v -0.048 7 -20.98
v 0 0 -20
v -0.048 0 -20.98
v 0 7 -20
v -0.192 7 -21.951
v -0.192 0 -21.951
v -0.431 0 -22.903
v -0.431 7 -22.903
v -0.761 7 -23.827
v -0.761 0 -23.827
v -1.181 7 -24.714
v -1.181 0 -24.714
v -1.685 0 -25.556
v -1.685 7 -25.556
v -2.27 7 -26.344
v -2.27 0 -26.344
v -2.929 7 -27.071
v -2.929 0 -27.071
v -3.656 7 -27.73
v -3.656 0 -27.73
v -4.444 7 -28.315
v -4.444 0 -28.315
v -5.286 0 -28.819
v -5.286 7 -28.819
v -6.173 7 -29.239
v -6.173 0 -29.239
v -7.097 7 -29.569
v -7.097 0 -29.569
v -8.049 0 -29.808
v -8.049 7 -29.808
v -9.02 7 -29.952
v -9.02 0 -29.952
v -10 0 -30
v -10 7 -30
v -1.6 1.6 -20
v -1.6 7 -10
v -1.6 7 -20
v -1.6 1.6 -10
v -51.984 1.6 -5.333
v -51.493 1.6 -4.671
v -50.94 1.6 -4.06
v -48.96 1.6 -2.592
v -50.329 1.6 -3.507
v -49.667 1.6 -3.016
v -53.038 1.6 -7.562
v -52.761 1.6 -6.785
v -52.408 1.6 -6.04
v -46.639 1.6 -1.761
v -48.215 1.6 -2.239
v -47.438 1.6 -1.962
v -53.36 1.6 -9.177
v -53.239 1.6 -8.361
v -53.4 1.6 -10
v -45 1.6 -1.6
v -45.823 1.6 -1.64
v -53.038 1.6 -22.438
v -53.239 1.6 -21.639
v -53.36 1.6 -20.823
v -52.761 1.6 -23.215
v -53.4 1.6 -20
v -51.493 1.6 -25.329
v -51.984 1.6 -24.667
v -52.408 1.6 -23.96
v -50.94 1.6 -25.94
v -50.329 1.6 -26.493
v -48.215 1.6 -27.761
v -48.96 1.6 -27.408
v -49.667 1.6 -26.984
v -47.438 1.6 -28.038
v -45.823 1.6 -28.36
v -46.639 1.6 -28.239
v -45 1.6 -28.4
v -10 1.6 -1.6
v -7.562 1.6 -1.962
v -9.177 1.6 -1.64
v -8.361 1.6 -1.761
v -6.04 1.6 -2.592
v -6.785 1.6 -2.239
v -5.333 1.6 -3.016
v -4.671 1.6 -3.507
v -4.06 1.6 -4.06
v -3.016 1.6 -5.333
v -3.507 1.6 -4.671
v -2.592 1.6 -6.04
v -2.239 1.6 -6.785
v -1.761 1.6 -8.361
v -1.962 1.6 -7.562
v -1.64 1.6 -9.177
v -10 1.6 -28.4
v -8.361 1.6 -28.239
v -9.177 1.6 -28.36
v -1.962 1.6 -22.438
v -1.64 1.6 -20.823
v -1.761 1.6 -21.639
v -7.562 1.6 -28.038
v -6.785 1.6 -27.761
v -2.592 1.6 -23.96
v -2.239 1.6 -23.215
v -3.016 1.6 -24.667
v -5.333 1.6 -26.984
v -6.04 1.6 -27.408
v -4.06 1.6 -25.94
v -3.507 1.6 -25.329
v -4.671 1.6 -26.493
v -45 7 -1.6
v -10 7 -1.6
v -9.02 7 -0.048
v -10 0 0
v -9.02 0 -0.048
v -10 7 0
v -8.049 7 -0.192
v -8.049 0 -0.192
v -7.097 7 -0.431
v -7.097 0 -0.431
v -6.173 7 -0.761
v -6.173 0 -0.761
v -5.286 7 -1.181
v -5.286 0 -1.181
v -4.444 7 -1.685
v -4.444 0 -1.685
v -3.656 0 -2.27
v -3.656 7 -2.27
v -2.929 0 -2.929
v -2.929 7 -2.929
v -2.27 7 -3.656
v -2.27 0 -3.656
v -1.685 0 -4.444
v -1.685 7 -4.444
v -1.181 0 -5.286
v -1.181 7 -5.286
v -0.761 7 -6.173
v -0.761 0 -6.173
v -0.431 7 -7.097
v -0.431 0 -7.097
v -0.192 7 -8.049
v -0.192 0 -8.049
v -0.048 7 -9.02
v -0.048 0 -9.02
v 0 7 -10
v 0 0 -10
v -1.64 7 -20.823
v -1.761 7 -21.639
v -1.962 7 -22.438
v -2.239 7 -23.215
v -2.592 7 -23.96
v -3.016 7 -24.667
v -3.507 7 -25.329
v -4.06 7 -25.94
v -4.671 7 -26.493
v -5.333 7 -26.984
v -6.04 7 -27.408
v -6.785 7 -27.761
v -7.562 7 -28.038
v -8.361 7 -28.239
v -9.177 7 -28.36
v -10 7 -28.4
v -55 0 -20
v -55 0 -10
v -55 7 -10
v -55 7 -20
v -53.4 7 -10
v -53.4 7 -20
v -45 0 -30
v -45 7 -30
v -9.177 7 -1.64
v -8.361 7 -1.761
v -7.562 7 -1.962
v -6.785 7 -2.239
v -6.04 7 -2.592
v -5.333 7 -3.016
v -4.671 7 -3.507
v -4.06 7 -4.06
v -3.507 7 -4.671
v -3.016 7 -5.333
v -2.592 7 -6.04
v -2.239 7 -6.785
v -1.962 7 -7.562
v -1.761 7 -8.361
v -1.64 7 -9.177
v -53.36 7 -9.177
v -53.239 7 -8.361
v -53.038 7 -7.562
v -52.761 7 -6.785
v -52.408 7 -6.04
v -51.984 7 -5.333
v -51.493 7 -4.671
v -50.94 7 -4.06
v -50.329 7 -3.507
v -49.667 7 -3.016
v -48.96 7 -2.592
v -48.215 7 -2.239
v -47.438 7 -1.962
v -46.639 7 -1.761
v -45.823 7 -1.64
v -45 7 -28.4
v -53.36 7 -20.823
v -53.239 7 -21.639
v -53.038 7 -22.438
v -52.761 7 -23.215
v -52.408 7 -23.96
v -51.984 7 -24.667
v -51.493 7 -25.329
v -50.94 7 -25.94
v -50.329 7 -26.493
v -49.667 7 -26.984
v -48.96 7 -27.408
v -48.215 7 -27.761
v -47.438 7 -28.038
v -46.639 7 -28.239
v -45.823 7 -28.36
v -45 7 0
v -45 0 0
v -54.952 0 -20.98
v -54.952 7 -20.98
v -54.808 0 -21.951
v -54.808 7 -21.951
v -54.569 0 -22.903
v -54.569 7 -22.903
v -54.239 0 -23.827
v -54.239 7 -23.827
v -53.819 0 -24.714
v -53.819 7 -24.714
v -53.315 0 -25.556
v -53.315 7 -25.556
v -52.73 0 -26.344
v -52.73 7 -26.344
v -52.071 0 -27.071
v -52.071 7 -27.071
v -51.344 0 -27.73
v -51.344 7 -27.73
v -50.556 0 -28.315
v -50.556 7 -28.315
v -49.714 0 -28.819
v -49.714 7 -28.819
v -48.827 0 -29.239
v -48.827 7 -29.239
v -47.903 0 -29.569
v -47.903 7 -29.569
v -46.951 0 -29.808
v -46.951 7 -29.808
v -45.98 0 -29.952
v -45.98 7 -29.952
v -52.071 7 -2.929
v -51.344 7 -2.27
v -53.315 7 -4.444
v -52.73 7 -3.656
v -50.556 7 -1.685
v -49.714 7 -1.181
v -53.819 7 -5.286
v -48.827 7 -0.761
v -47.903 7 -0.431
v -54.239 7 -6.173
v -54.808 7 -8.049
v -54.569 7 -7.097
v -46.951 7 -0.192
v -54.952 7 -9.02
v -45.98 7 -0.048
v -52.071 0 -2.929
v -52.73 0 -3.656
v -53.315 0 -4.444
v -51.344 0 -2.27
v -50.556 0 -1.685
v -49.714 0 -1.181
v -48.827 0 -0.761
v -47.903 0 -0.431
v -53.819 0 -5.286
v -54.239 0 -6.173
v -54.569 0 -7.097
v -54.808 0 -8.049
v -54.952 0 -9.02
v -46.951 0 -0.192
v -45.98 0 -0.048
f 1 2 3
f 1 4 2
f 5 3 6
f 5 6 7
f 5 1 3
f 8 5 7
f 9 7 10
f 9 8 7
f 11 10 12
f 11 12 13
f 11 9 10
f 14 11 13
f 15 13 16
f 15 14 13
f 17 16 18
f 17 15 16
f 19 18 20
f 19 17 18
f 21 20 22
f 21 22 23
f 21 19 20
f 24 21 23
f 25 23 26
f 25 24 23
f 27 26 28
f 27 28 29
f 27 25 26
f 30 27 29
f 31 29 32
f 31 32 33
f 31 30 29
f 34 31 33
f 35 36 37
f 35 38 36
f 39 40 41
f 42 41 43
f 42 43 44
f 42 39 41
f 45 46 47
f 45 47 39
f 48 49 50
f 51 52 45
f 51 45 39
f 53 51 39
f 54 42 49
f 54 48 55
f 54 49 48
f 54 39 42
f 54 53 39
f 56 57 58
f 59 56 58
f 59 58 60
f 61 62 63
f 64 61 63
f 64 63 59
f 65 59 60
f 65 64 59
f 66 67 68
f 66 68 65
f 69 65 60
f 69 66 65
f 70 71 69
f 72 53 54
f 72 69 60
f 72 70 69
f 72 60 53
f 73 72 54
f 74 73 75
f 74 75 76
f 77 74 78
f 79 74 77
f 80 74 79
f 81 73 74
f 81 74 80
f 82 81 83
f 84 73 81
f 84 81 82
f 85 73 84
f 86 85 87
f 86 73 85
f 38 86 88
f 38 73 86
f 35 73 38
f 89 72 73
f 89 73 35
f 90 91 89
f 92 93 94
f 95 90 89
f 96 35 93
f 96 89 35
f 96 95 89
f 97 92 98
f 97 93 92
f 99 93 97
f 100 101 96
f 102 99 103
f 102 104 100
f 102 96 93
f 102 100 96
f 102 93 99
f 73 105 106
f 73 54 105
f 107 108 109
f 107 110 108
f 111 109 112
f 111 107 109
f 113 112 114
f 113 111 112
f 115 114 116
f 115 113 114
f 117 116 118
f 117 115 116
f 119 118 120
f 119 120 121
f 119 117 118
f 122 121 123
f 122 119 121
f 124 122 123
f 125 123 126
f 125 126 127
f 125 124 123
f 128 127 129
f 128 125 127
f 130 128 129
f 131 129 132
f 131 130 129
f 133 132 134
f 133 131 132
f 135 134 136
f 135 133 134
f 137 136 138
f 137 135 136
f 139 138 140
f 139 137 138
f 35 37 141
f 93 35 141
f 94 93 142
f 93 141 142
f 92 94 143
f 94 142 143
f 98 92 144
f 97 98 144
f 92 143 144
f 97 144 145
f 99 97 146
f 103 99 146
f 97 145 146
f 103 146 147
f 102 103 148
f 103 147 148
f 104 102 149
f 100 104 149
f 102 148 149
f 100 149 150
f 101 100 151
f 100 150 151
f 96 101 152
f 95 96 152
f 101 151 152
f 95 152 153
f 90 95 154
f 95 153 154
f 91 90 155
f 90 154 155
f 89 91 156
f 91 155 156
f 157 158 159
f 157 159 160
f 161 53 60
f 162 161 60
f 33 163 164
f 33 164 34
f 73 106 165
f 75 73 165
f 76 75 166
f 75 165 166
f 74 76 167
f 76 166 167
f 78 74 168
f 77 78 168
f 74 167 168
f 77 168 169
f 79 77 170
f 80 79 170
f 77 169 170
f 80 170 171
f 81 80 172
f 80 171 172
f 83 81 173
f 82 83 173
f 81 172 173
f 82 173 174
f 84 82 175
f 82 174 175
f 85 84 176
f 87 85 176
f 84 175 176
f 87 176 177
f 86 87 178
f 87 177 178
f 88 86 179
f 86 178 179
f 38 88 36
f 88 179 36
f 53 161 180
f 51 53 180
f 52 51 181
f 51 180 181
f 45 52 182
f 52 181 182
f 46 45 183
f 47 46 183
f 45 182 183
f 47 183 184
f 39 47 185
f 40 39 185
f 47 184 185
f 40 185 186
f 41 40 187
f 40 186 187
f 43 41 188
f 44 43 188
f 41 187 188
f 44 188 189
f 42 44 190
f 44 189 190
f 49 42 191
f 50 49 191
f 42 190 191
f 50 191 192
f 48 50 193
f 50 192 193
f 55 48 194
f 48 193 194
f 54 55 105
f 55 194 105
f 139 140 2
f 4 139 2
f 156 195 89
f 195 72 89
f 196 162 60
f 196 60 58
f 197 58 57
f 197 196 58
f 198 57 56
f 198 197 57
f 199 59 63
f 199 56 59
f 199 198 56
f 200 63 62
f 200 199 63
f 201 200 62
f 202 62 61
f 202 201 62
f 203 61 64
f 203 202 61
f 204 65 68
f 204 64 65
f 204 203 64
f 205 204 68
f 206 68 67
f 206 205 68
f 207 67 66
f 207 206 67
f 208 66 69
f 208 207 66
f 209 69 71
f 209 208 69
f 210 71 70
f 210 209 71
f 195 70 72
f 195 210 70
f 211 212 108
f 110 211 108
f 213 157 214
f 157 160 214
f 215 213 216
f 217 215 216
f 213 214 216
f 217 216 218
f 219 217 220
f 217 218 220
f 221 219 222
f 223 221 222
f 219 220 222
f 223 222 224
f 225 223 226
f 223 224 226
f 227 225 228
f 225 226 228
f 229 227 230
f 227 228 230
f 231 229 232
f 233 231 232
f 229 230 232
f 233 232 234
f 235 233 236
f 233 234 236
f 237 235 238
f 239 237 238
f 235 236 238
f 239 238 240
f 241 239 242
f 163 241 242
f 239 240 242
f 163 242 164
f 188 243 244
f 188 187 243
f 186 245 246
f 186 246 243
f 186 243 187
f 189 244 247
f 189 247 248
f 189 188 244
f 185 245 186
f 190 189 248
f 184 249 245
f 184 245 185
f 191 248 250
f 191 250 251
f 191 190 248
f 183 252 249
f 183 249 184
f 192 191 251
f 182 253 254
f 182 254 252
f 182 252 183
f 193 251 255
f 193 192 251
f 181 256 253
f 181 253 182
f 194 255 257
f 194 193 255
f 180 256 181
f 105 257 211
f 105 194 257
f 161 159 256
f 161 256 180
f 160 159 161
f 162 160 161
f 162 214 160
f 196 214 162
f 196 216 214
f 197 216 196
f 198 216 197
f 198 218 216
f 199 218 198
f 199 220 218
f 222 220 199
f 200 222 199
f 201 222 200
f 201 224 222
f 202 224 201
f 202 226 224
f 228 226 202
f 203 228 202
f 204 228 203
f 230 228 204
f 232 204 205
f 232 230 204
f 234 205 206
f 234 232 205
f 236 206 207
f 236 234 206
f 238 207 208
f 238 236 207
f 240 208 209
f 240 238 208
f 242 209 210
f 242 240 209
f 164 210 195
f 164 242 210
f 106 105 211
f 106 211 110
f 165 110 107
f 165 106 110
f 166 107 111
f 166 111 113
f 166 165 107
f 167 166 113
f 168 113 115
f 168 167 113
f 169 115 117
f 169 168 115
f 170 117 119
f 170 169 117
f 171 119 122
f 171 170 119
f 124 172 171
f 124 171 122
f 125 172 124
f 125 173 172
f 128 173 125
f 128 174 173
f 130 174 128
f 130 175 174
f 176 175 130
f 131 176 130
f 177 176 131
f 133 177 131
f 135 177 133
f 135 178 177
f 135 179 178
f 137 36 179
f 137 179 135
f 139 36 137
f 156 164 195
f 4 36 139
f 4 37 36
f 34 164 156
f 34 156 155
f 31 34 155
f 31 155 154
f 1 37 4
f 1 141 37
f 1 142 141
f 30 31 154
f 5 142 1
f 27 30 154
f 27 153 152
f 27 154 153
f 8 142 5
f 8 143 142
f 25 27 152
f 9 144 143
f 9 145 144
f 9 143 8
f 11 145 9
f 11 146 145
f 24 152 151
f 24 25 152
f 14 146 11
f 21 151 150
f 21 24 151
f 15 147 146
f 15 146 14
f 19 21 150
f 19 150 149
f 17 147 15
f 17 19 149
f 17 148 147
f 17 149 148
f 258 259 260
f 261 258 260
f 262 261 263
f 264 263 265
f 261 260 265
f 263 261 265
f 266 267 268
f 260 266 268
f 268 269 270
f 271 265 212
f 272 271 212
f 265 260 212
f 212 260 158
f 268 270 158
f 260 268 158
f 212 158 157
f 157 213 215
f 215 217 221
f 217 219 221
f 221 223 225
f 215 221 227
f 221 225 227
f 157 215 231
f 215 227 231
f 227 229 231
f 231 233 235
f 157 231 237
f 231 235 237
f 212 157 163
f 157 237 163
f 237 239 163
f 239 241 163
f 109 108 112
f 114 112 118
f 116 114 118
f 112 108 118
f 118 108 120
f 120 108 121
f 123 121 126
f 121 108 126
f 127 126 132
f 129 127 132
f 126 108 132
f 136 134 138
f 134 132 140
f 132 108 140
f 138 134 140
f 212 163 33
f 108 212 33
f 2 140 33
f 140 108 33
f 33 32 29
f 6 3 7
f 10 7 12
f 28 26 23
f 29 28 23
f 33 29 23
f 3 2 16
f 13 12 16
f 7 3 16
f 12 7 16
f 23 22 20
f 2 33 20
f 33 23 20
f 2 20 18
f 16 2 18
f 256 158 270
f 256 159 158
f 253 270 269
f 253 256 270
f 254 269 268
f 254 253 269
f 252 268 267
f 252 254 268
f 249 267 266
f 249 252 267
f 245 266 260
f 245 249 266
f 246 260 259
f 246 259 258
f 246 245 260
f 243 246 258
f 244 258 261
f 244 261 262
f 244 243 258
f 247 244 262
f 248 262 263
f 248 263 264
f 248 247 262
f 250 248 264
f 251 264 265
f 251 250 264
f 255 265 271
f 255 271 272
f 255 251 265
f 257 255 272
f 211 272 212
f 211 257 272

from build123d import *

# Parameters (mm, degrees)
SKICA1_W                = 55
SKICA1_H                = 30
P_IDAT_VYSUNUT_M1_DEPTH = 7
ZAOBLIT1_R              = 10
SKO_EPINA1_T            = -1.6


with BuildPart() as part:
    # Skica1 → Přidat vysunutím1 (new body)
    with BuildSketch(Plane(origin=(0, 0, 0), x_dir=(1, 0, 0), z_dir=(0, 1, 0))):
        with Locations((-27.5, 15)):
            Rectangle(SKICA1_W, SKICA1_H)
    extrude(amount=P_IDAT_VYSUNUT_M1_DEPTH)

    # Zaoblit1
    zaoblit1_edges = [part.edges().sort_by_distance(p)[0] for p in [
        (0, 3.5, 0),
        (-55, 3.5, 0),
        (-55, 3.5, -30),
        (0, 3.5, -30),
    ]]
    fillet(zaoblit1_edges, radius=ZAOBLIT1_R)

    # Skořepina1
    sko_epina1_openings = [part.faces().sort_by_distance(p)[0] for p in [
        (-27.5, 7, -15),
    ]]
    offset(amount=SKO_EPINA1_T, openings=sko_epina1_openings, kind=Kind.INTERSECTION)


solid = part.part
